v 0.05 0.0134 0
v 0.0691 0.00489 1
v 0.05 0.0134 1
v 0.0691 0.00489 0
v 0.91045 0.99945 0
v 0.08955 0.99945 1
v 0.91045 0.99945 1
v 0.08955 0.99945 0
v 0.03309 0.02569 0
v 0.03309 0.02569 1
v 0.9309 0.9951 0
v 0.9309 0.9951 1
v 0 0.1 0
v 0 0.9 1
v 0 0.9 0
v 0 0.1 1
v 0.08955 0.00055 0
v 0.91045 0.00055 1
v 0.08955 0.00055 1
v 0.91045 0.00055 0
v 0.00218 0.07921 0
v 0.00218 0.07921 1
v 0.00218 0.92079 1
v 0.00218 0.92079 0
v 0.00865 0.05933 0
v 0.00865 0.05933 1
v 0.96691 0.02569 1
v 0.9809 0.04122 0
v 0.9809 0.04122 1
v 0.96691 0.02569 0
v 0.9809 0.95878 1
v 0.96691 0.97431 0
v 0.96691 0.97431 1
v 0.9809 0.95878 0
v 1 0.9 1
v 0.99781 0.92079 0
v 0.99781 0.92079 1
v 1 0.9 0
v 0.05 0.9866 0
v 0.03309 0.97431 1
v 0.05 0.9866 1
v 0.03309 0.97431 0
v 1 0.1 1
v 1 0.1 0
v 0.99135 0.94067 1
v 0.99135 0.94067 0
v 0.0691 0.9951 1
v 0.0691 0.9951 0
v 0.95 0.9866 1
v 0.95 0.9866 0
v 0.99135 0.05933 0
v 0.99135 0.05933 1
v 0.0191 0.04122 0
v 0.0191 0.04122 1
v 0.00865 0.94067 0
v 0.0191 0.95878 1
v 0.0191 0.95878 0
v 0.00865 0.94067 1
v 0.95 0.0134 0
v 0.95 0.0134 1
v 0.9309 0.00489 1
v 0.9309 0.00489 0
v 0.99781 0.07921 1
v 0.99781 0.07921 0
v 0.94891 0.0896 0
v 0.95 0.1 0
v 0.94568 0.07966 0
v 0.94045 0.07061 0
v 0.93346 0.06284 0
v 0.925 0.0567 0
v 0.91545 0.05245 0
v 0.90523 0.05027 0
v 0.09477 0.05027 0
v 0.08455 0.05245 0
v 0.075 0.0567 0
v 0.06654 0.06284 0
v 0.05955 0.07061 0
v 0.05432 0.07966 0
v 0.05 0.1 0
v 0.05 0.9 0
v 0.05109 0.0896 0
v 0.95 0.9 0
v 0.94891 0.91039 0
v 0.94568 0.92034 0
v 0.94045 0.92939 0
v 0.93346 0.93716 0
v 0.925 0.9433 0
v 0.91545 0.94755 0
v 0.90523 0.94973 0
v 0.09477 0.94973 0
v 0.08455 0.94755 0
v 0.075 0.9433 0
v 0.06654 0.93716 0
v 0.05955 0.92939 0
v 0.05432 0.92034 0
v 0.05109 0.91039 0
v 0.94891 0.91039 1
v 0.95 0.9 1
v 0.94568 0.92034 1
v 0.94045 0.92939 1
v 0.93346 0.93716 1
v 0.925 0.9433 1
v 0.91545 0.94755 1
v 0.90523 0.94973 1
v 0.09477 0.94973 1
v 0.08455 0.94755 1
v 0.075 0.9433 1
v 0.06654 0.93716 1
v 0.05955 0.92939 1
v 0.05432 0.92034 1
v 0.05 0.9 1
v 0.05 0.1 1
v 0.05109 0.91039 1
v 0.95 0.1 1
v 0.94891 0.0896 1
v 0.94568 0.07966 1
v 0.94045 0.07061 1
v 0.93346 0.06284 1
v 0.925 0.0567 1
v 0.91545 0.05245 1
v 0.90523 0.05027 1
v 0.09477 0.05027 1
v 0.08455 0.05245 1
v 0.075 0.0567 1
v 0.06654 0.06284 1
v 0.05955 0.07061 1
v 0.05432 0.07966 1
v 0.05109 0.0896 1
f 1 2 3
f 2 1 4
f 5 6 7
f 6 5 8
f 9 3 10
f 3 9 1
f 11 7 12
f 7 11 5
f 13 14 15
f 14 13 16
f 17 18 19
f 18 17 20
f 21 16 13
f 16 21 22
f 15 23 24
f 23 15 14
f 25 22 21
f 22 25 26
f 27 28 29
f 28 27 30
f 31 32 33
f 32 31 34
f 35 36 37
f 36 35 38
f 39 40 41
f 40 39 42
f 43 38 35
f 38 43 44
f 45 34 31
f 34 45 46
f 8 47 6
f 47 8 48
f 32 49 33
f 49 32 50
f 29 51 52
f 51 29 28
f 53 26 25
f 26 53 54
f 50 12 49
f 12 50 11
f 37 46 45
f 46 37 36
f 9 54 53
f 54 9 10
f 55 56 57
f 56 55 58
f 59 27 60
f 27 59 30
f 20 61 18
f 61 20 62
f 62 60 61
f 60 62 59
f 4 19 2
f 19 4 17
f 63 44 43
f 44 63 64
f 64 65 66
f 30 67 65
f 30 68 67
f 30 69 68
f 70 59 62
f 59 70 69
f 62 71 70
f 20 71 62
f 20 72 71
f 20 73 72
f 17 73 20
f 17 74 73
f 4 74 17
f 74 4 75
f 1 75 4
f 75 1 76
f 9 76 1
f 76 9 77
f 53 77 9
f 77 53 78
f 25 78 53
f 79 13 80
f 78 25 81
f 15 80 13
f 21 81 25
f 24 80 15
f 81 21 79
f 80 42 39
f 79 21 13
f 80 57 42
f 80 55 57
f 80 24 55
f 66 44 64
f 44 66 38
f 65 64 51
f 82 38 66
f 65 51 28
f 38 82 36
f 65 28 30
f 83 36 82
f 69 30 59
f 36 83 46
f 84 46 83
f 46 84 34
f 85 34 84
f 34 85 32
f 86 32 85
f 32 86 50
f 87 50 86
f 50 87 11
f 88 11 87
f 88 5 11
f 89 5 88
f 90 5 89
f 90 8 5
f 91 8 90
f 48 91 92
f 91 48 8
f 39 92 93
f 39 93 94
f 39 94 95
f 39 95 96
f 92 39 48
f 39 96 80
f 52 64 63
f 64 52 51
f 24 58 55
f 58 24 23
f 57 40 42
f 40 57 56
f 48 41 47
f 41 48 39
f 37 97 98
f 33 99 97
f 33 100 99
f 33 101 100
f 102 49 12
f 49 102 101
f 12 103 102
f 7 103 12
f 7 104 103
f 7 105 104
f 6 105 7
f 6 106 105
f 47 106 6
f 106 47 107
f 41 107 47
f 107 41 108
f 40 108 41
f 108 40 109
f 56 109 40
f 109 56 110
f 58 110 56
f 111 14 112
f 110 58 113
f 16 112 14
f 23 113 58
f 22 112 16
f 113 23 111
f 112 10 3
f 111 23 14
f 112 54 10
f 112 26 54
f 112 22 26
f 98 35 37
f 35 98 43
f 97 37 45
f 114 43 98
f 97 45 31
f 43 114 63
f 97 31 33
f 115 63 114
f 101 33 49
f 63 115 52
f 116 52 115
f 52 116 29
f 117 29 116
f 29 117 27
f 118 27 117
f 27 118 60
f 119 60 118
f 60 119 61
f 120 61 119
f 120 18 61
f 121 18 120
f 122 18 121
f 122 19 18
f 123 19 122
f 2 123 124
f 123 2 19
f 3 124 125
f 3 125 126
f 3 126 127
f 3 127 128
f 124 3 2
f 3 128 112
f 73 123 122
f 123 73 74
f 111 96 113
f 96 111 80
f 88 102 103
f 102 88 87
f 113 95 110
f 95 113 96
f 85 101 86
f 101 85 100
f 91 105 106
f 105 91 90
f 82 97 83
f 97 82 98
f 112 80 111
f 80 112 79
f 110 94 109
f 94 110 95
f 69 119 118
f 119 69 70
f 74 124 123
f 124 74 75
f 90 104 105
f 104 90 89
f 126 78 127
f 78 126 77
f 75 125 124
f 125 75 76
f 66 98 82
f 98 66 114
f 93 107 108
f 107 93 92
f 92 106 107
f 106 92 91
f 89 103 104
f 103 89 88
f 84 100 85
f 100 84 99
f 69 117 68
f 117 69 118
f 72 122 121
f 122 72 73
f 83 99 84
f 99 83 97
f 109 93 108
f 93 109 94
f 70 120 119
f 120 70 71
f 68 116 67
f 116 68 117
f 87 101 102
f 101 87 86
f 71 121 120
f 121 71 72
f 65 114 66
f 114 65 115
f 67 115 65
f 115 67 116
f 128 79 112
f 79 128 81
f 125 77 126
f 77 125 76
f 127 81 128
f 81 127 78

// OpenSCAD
// file: corner_sphere.scad
// Find coordinates of sphere placed in corner

// Return 1 if angle between vectors less than pi, -1 otherwise
function _is_acute(u,v)=
    u*v/(norm(u)*norm(v)) >= 0 ? 1 : -1;

// Find inverse of 3 x 3 matrix
function _inv_3x3(X)=
let (
a=X[0][0],
b=X[0][1],
c=X[0][2],
d=X[1][0],
e=X[1][1],
f=X[1][2],
g=X[2][0],
h=X[2][1],
i=X[2][2],
A = (e*i-f*h)  ,
D = -(b*i-c*h) ,
G = (b*f-c*e)  ,
B = -(d*i-f*g) ,
E = (a*i-c*g)  ,
H = -(a*f-c*d) ,
C = (d*h-e*g)  ,
F = -(a*h-b*g) ,
I = (a*e-b*d)  ,
detA=a*A+b*B+c*C) 
[[A,D,G],[B,E,H],[C,F,I]]/detA;

// Pack vectors into a column matrix
function _col_pack_3x3(a,b,c)=
[
[a[0],b[0],c[0]],
[a[1],b[1],c[1]],
[a[2],b[2],c[2]],
];

// Returns coordinates of sphere placed in corner
function corner_sphere(A,B,C,r)=
let (
M=(A+B+C)/3.,
a_=cross(A,B),
b_=cross(A,C),
c_=cross(B,C),
a=a_*_is_acute(a_,M),
b=b_*_is_acute(b_,M),
c=c_*_is_acute(c_,M),
X=[a,b,c]) // no need to transpose it seems
_inv_3x3(X)*(r*[norm(a),norm(b),norm(c)]);

// For testing, specify A B C r on command line
echo(corner_sphere(A,B,C,r));
// file: common.scad
function assertion_failed()=(assertion_failed());

module domeassert(x,msg)
{ 
if (!x) {
    echo("this shit failed:", msg);
    echo("",assertion_failed());
}
}

module rounded_square(
    center, // x,y,z coordinates of center
    dims, // width (x dimension), length (y dimension), height (z dimension)
    corner_radius, // the radius of the corners
) {
    // the corners
    corners_x=[-(dims[0]*0.5-corner_radius),(dims[0]*0.5-corner_radius)];
    corners_y=[-(dims[1]*0.5-corner_radius),(dims[1]*0.5-corner_radius)];
    translate(center) {
        // Draw the corners
        for (x=corners_x) {
            for(y=corners_y) {
                translate ([x,y,0]) {
                    cylinder(r=corner_radius,h=dims[2],center=true);
                }
            }
        }
        // draw the inner cube
        cube([dims[0]-2*corner_radius,dims[1]-2*corner_radius,dims[2]],center=true);
        // fill in the edges
        for (x=corners_x) {
            translate([x,0,0]) {
                cube([2*corner_radius,dims[1]-2*corner_radius,dims[2]],center=true);
            }
        }
        for (y=corners_y) {
            translate([0,y,0]) {
                cube([dims[0]-2*corner_radius,2*corner_radius,dims[2]],center=true);
            }
        }
        
    }
}

module rounded_shaft(
    center, // x,y,z coordinates of center
    dims, // width (x dimension), length (y dimension), height (z dimension) (INSIDE of shaft)
    corner_radius, // the radius of the corners of the INSIDE of the shaft
    wall_thickness, // the thickness of the walls
) {
difference(){
rounded_square(center,[dims.x+2*wall_thickness,dims.y+2*wall_thickness,dims.z],wall_thickness+corner_radius);
rounded_square(center,[dims.x,dims.y,dims.z+1e-3],corner_radius);
}
}

function zeroz(p)=[p[0],p[1],0];
function wrap(i,mi,ma)=(i<mi?wrap(i+(ma-mi),mi,ma):i>=ma?wrap(i-(ma-mi),mi,ma):i);
function index_slice(a,start,end)=[for(i=[start:(end-1)])a[wrap(i,0,len(a))]];
// file: rounded_polygon.scad
use <corner_sphere.scad>

function vadd(points,point)=[for(p=points)p+point];
function vmulc(points,c)=[for(p=points)p*c];
function sum(list, idx = 0, result = 0) = 
	idx >= len(list) ? result : sum(list, idx + 1, result + list[idx]);
function midpoint(points)=sum(points,result=[0,0,0])/len(points);
function normalize(p)=p/norm(p);
function normalize_l(ps)=[for(p=ps)normalize(p)];
// The projection of A onto B
function proj_v(A,B)=(A*B)/(B*B)*B;
// vectorized indexing
function index_v(p,i)=[for(i_=i)p[i_]];

// The center of the circle given by rounded corner
function rounded_corner_center(
    point_left,
    point_center,
    point_right,
    r // radius of circle at corner
    )=
    let(
    A_=point_left-point_center,
    B_=point_right-point_center,
    A=A_/norm(A_),
    B=B_/norm(B_),
    M=(A+B)*0.5,
    a=r/norm(M-1*(M*B)/(B*B)*B)) point_center + a*M;


function rounded_corner_centers(
    points,
    r)=let(
    points_=concat([points[len(points)-1]],points,[points[0]]))
        [for (i=[0:len(points_)-3])rounded_corner_center(points_[i],points_[i+1],points_[i+2],r)];
    

module rounded_corner(
    point_left,
    point_center,
    point_right,
    r, // radius of circle at corner
    h
) {
    translate(rounded_corner_center(point_left,point_center,point_right,r))
            cylinder(r=r,h=h); 
}

module rounded_convex_polygon(
    points,
    r,
    h
)
{
    points_=concat([points[len(points)-1]],points,[points[0]]);
    hull () {
        for (i=[0:len(points_)-3]) {
            rounded_corner(points_[i],points_[i+1],points_[i+2],r,h);
        }
    }
}

module _polygon_corners(
    points,
    r,
    h
)
{
    points_=concat([points[len(points)-1]],points,[points[0]]);
    for (i=[0:len(points_)-3]) {
        rounded_corner(points_[i],points_[i+1],points_[i+2],r,h);
    }
}

//allows removing the center with a constant wall width
//note the minimum radius of the inner polygon's corners is 1e-3
module hollow_rounded_convex_polygon(
points,
r,
h,
w,
test=false)
{
    inner_centers=rounded_corner_centers(points,r);
    inner_r=max(r-w,1e-3);
    if (test) {
        _polygon_corners(
            points,
            r,
            h
        );
        for (point=inner_centers) {
            translate(point) cylinder(r=inner_r,h=2*h);
        }
    } else {
        difference () {
            rounded_convex_polygon(points,r,h);
            hull () {
                for (point=inner_centers) {
                    translate(point) cylinder(r=inner_r,h=h);
                }
            }
        }
    }
}

// returns the point of the sphere sitting in the corner desribed by these
// points
// NOTE: If there's not enough "room" inside of the polygon, the sphere will
// protrude, there's nothing this can do about it
// TODO: Not sure if this works for more than 3 points
// NOTE: If the cross product between the first 2 points (or any points really)
// is [0,0,0], then the result is undefined (divide by 0 basically).
function rounded_3d_inside_corner(
    center, // the point the bisector exits from
    points, // the points that are connected to the center point
    r, // radius of circle at corner
)=
let(
   //points_=normalize_l(vadd(points,-center))
   points_=vadd(points,-center)
//   M=midpoint(points_),
//   N=cross(points_[0],points_[1]),
//   a=r/norm(M-(M-proj_v(M,N)))
   //why this doesn't work, I don't know
   //proj_v(M,points_[0])+proj_v(M,points_[1])), shouldn't it be the same as
   //projecting onto the plane spanned by points_[0] and points_[1] ?
)center+corner_sphere(points_[0],points_[1],points_[2],r);
//sum(vmulc(points_,r),result=[0,0,0])+center;//a*M+center;

// Gives a bunch of spheres describing the outside of the convex hull
// representing a rounded polyhedron
// To make into a polyhedron, simply surround with hull () { ... }
module rounded_convex_set_vertices(
    points, // the points in the polygon
// a list of lists containing indices of the points each point is connected to by an edge
// i.e., the list at the 0th index lists the indices of the points the 0th point
// is connected to
    point_idx,
    r, // radii of circles at corner
    //TODO: Not sure how correct this is if more than 3 edges meet at a vertex
){
        for (i=[0:len(points)-1]) {
            echo(index_v(points,point_idx[i]));
            translate(rounded_3d_inside_corner(points[i],index_v(points,point_idx[i]),r[i]))
                sphere(r[i]);
        }
}

module rounded_convex_polyhedron(
    points, // the points in the polygon
// a list of lists containing indices of the points each point is connected to by an edge
// i.e., the list at the 0th index lists the indices of the points the 0th point
// is connected to
    point_idx,
    r, // radii of circles at corner
    //TODO: Not sure how correct this is if more than 3 edges meet at a vertex
) {
    hull () {
        rounded_convex_set_vertices(points,point_idx,r);
    }
}

module rounded_convex_polyhedron_c(
    points, // the points in the polygon
// a list of lists containing indices of the points each point is connected to by an edge
// i.e., the list at the 0th index lists the indices of the points the 0th point
// is connected to
    point_idx,
    r, // radius of circles at corner
) {
    rounded_convex_polyhedron(points,point_idx,[for(i=[1:len(points)])r]);
}

// Gives a polygon with the rounded polyhedron subtracted out of it
// TODO: This isn't tested, may never work.
module inverse_rounded_convex_polyhedron( points, point_idx, r)
{
   difference () { 
        rounded_convex_polyhedron_c(points,point_idx,1e-3); 
        scale([1.01,1.01,1.01]) rounded_convex_polyhedron(points,point_idx,r);
   }
}

//$fn=10;
//for (i=[1:5]) {
//    rounded_convex_polygon([[1,6],[1,1],[2,1],[3,4]],i*0.05,i);
//}
//tetra_points=[[1,1,1],[1,-1,-1],[-1,1,-1],[-1,-1,2]];
tetra_points=[[0,0,0],[-1,0,0],[0,-1,0],[0,0,-1]];
        rounded_convex_polyhedron_c(
                tetra_points,
                [[1,2,3],[0,2,3],[0,1,3],[0,1,2]],
                0.01);

box_points=[[0,0,0],[0,0,1],[0,1,0],[0,1,1],[1,0,0],[1,0,1],[1,1,0],[1,1,1]];
*rounded_convex_polyhedron_c(
        vmulc(box_points,1),
        [[1,2,4],[0,3,5],[0,3,6],[2,1,7],[0,5,6],[4,7,1],[4,2,7],[3,5,6]],
        0.1);

top_s=0.3;
trap_points=[[0,0,0],[top_s,top_s,1],[0,1,0],[top_s,1-top_s,1],[1,0,0],[1-top_s,top_s,1],[1,1,0],[1-top_s,1-top_s,1]];
rounded_convex_polyhedron(
        vmulc(trap_points,1),
        [[1,2,4],[0,3,5],[0,3,6],[2,1,7],[0,5,6],[4,7,1],[4,2,7],[3,5,6]],
        [for(i=[0:len(trap_points)-1])trap_points[i][2]==1?0.1:0.001]);
polyhedron(
        [[0,0,0],[0,0,1],[1,0,0],[1,0,1],[0,top_s,1],[1,top_s,1]],
        faces=[[0,1,3,2],[0,1,4],[2,3,5],[0,2,5,4],[1,3,5,4]]);
translate([-1,0,0]) cube([1,1,1]);
translate([0,-1,0]) cube([1,1,1]);
translate([1,1,0])
rounded_convex_polyhedron_c(
        vmulc(trap_points,1),
        [[1,2,4],[0,3,5],[0,3,6],[2,1,7],[0,5,6],[4,7,1],[4,2,7],[3,5,6]],
        0.1);
/*
translate([1,0,0])
trap_points_i=[[0,0,0],[top_s-1,top_s,1],[0,1,0],[top_s-1,1-top_s,1],[1,0,0],[1-top_s,top_s,1],[1,1,0],[1-top_s,1-top_s,1]];
inverse_rounded_convex_polyhedron(trap_points,
        [[1,2,4],[0,3,5],[0,3,6],[2,1,7],[0,5,6],[4,7,1],[4,2,7],[3,5,6]],
        [for(i=[0:len(trap_points)-1])trap_points[i][2]==0?0.1:0.001]);
*/
// main file
use <rounded_polygon.scad>
use <common.scad>


$fn=30;
    
echo("hihi ",rounded_corner_centers([[0,0,0],[1,0,0],[1,1,0],[0,1,0]],0.1));
//rounded_convex_polygon([[0,0,0],[1,0,0],[1,1,0],[0,1,0]],0.1,1);
hollow_rounded_convex_polygon([[0,0,0],[1,0,0],[1,1,0],[0,1,0]],0.1,1,0.05);

//rounded_shaft(
//[0.5,0.5,0.5],
//[.9,.9,.9],
//.05,
//.1);
